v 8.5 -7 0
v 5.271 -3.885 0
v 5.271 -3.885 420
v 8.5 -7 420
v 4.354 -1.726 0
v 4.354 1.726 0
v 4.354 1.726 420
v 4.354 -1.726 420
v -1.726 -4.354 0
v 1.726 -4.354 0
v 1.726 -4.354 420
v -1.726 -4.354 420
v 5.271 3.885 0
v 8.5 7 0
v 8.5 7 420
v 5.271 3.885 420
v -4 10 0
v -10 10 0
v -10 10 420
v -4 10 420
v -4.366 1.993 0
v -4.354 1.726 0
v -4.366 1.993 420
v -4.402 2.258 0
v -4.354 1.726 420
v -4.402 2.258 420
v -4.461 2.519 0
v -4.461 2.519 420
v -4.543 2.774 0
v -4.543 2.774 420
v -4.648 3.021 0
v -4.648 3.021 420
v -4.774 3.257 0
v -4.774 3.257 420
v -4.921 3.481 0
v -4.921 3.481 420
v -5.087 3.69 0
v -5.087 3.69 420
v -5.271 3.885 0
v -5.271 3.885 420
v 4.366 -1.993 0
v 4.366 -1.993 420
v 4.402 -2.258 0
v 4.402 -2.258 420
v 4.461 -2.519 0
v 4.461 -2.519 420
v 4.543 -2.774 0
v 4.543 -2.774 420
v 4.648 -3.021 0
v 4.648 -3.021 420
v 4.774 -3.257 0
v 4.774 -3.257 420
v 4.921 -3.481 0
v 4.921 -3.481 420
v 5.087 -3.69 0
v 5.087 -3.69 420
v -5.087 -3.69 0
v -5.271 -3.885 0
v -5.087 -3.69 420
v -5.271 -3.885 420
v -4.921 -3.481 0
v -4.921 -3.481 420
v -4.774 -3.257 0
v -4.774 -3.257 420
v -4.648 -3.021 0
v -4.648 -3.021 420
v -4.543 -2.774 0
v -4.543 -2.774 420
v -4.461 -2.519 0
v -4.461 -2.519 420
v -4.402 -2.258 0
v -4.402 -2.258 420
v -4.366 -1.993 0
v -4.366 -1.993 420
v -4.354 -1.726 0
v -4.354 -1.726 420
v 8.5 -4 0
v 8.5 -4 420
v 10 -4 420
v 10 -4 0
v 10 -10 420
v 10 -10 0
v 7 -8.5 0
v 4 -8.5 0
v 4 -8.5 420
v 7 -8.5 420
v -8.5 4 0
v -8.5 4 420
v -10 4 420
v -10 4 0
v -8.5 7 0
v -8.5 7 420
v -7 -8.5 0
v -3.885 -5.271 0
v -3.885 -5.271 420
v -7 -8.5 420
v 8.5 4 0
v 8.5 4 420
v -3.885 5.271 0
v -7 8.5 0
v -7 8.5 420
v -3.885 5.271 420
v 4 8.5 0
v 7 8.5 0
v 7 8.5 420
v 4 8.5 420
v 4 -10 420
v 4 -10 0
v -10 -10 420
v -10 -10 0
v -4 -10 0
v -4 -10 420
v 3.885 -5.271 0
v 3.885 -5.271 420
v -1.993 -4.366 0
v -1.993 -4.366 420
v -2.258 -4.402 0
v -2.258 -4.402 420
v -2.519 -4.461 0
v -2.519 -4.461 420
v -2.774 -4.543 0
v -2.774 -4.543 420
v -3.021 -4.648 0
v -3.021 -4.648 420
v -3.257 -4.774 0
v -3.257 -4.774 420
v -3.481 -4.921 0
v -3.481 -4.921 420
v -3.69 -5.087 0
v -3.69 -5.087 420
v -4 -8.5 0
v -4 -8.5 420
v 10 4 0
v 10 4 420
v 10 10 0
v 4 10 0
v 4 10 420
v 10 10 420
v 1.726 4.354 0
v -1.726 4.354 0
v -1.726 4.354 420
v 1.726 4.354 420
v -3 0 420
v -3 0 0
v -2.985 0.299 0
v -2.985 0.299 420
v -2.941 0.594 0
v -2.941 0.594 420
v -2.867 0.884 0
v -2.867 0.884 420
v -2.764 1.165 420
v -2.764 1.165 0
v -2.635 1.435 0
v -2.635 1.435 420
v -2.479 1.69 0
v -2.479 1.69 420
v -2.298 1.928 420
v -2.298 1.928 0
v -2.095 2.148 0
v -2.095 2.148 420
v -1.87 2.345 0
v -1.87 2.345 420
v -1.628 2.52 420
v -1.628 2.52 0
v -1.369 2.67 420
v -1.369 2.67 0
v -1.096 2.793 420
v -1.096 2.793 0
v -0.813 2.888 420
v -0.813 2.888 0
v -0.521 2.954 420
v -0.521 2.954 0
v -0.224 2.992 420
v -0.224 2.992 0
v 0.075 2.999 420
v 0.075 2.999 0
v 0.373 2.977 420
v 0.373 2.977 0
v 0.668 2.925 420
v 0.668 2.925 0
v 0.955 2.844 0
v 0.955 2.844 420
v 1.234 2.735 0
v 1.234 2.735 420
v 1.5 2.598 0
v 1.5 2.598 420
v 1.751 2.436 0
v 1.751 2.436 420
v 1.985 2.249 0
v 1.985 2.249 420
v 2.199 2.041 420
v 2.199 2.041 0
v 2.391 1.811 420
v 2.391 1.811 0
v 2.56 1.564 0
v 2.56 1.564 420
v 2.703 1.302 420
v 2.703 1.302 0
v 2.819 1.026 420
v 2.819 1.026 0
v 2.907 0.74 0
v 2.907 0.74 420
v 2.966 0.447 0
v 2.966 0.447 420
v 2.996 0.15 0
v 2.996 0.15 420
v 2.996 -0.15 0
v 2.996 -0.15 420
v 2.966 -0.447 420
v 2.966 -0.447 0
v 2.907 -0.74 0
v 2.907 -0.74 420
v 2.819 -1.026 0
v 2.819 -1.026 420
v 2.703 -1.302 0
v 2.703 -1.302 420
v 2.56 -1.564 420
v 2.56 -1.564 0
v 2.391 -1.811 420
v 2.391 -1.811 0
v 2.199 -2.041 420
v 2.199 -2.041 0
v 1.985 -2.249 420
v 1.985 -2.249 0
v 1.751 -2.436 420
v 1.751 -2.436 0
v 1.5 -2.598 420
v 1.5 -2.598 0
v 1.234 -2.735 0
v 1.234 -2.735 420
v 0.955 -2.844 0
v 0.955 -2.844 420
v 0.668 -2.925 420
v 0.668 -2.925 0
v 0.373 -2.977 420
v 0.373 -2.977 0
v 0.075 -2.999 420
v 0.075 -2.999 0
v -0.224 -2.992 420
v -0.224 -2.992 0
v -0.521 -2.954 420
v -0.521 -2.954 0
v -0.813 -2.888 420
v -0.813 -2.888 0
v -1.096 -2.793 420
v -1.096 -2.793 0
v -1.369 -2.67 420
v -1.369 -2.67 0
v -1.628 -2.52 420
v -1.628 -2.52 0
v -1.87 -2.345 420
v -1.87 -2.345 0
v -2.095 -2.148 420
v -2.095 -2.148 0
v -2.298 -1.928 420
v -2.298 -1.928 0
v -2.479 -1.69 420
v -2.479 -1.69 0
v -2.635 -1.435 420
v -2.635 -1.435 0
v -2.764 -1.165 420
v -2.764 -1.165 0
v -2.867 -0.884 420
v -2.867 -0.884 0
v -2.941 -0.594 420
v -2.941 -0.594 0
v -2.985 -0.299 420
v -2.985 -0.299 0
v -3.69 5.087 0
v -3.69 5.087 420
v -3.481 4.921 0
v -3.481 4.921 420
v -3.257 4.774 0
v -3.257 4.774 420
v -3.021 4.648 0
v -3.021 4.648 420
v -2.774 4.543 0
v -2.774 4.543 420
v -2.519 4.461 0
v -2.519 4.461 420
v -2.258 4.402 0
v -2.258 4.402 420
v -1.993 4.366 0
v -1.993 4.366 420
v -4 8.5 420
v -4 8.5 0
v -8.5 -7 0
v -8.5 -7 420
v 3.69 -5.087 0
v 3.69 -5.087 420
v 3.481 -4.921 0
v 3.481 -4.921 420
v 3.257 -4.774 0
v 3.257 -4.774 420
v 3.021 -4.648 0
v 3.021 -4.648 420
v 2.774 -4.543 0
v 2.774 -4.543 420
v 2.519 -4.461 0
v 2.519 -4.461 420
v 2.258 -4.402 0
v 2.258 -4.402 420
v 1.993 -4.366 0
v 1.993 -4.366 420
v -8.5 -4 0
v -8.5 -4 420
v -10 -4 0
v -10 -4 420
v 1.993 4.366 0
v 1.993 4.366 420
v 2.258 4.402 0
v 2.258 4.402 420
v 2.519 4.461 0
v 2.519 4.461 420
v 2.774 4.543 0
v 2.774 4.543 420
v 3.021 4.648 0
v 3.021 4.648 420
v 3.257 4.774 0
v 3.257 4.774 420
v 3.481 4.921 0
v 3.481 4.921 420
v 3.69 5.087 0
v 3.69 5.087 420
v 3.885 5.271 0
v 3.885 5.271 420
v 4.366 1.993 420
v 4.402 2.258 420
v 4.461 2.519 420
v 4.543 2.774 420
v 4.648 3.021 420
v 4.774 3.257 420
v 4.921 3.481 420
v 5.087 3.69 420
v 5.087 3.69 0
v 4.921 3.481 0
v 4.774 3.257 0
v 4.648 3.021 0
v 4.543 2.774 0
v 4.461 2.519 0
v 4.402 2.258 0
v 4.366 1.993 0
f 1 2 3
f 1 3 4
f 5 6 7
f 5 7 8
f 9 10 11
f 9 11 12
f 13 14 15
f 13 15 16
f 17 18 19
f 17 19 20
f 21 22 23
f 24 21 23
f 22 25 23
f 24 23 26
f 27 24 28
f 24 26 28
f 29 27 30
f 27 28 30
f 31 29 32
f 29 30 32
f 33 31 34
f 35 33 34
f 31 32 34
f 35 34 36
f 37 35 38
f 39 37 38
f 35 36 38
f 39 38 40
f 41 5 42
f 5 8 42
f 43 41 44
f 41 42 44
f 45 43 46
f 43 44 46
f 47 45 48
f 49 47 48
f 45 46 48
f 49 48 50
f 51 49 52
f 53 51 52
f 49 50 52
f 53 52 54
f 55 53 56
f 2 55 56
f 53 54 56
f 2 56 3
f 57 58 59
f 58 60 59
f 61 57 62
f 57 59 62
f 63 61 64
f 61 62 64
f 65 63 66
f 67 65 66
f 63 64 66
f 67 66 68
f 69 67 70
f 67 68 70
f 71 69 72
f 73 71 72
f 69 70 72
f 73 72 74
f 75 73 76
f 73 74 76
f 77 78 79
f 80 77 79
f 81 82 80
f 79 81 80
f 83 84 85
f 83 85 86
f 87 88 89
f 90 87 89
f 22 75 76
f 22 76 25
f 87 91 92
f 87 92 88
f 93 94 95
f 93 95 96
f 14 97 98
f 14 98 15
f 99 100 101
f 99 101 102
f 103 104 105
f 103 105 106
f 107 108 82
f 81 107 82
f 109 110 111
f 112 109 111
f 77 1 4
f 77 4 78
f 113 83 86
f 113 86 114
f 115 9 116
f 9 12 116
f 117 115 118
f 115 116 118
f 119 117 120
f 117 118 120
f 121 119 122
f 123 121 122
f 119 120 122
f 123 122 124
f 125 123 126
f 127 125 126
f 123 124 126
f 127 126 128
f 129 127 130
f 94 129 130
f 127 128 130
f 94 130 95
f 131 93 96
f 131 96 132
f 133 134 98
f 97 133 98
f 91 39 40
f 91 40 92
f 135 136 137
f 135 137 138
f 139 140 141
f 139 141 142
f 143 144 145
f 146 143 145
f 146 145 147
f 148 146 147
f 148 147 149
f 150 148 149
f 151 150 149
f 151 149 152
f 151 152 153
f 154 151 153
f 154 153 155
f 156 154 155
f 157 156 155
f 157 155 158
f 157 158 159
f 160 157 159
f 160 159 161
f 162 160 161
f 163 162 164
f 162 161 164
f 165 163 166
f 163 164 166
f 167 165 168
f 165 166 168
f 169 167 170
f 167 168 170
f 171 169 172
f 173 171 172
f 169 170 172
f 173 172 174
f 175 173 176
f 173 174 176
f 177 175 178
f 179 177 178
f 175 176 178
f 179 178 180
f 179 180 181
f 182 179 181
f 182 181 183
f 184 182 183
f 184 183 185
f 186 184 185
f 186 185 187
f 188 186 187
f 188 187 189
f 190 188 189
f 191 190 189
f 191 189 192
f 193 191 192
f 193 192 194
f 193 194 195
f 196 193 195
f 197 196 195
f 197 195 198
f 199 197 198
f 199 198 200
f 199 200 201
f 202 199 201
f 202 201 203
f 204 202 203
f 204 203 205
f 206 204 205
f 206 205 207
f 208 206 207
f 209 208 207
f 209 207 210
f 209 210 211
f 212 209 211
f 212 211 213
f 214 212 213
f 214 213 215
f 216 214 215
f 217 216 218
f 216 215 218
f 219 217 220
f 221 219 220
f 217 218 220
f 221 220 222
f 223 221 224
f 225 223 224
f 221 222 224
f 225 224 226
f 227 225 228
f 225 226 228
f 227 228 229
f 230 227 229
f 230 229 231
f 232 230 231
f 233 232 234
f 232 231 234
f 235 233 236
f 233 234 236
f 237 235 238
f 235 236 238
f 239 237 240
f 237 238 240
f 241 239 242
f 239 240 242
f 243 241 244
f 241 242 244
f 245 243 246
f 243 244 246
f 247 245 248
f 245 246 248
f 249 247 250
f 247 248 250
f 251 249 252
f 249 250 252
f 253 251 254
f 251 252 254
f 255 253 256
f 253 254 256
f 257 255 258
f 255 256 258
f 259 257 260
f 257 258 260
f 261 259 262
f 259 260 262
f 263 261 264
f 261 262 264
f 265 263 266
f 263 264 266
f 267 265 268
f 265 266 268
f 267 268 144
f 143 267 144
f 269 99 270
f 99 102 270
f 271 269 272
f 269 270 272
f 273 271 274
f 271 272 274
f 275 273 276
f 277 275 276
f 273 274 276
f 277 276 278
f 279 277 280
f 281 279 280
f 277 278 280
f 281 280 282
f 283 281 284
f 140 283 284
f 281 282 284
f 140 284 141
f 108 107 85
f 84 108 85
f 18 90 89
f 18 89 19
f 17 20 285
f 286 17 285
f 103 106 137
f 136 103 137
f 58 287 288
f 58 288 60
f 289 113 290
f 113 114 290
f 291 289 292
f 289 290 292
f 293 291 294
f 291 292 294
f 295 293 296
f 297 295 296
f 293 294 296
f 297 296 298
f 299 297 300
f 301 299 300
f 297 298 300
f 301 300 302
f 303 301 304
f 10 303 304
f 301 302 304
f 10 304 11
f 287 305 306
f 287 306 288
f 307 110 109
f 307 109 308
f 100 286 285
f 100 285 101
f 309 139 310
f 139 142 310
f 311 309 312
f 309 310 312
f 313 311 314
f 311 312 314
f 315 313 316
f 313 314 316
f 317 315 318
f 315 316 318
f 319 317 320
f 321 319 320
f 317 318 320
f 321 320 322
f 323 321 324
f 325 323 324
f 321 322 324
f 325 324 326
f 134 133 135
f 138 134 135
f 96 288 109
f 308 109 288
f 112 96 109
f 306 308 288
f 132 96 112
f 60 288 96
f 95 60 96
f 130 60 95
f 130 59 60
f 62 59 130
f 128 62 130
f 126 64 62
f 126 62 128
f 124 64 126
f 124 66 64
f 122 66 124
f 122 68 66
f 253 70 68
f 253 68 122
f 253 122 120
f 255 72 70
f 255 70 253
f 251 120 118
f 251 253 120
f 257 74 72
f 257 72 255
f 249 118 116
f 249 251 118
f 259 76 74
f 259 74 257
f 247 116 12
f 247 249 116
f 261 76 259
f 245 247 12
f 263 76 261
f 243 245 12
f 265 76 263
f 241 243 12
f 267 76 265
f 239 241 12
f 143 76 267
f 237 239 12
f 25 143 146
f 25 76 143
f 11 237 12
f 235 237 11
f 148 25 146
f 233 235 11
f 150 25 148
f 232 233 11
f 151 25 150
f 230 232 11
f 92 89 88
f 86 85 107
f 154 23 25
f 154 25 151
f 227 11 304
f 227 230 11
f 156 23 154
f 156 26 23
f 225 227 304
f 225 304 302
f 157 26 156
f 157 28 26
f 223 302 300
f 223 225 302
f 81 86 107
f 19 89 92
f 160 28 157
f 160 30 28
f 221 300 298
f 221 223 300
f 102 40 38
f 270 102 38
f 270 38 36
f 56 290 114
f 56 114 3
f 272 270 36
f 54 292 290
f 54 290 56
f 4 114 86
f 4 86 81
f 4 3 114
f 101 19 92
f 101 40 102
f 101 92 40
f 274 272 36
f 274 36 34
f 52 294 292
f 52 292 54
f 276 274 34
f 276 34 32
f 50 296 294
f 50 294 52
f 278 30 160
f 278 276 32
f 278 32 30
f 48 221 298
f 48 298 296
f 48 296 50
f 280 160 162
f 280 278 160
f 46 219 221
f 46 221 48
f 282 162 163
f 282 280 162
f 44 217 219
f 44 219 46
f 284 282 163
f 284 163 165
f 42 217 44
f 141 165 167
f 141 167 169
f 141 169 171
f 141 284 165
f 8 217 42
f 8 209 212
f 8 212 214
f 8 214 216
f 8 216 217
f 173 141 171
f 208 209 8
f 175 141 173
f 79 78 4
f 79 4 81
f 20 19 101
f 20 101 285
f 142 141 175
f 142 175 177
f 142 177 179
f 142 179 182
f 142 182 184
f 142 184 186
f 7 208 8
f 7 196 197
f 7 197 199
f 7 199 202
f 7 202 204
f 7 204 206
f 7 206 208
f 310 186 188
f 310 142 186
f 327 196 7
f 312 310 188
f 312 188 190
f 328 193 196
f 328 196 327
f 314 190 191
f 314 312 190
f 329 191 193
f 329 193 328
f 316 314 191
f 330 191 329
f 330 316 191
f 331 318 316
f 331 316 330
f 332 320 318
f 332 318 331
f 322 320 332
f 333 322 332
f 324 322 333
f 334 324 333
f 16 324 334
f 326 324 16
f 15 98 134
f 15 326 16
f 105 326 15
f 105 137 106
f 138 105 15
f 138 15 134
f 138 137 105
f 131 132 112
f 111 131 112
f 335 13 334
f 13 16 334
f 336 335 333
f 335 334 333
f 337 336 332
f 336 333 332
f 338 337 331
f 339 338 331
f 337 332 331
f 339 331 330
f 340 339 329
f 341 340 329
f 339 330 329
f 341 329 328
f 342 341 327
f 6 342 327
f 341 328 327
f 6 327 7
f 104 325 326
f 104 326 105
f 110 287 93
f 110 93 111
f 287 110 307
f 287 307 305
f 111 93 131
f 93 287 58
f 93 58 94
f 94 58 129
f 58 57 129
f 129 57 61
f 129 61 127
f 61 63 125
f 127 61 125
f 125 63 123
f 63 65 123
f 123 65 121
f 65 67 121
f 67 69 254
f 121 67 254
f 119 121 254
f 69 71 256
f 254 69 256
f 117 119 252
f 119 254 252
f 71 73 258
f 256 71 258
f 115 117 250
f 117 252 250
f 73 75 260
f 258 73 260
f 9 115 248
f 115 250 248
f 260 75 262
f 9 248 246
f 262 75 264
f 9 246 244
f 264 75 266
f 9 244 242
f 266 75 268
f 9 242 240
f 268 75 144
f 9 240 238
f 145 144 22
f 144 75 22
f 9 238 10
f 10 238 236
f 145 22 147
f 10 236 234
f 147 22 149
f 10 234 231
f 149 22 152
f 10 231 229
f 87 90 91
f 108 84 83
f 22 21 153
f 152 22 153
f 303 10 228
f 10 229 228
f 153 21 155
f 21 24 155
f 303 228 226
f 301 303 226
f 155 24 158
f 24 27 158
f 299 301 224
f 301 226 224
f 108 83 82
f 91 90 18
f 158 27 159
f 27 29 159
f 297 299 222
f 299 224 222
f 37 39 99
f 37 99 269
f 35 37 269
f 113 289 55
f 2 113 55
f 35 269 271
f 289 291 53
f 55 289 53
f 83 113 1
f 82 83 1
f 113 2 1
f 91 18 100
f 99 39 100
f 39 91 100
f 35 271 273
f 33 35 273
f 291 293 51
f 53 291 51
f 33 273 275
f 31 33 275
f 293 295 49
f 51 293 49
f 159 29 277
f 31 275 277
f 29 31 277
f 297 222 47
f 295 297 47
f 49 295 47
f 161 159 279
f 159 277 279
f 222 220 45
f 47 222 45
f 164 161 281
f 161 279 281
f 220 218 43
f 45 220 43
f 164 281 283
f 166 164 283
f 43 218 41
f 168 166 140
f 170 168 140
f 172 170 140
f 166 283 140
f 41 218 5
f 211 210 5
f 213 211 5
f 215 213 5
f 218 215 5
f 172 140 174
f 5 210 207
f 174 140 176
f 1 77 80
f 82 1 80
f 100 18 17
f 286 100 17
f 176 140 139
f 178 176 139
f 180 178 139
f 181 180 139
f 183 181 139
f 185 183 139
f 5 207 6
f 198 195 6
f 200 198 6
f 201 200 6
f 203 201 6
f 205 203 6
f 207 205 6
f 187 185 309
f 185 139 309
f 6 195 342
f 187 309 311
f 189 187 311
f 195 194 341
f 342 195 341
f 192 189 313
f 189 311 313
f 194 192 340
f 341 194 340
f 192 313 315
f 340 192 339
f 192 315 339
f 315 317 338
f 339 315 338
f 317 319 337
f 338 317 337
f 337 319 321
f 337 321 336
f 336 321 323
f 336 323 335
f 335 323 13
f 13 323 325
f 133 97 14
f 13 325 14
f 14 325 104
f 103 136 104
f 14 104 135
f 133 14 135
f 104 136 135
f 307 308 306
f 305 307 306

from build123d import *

# Parameters (mm, degrees)
ESBO_O1_W                  = 20
ESBO_O1_H                  = 20
RESSALTO_EXTRUS_O1_DEPTH   = 420
ESBO_O2_R                  = 3
CORTE_EXTRUS_O1_DEPTH      = 1
CORTE_EXTRUS_O1_DEPTH_BACK = 421
FILETE1_R                  = 3


with BuildPart() as part:
    # Esboço1 → Ressalto-extrusão1 (new body)
    with BuildSketch(Plane.XY):
        Rectangle(ESBO_O1_W, ESBO_O1_H)
    extrude(amount=RESSALTO_EXTRUS_O1_DEPTH)

    # Esboço2 → Corte-extrusão1 (cut, two sides)
    with BuildSketch(Plane(origin=(0, 0, 0), x_dir=(-1, 0, 0), z_dir=(0, 0, -1))) as corte_extrus_o1_sk:
        Circle(ESBO_O2_R)
        Polygon((-10, 4), (-8.5, 4), (-8.5, 7), (-4.353828188, 3), (-4.353828188, -3), (-8.5, -7), (-8.5, -4), (-10, -4), align=None)
        Polygon((4, 10), (4, 8.5), (7, 8.5), (3, 4.353828188), (-3, 4.353828188), (-7, 8.5), (-4, 8.5), (-4, 10), align=None)
        Polygon((10, -4), (8.5, -4), (8.5, -7), (4.353828188, -3), (4.353828188, 3), (8.5, 7), (8.5, 4), (10, 4), align=None)
        Polygon((-4, -10), (-4, -8.5), (-7, -8.5), (-3, -4.353828188), (3, -4.353828188), (7, -8.5), (4, -8.5), (4, -10), align=None)
    extrude(amount=CORTE_EXTRUS_O1_DEPTH, mode=Mode.SUBTRACT)
    extrude(corte_extrus_o1_sk.sketch, amount=-CORTE_EXTRUS_O1_DEPTH_BACK, mode=Mode.SUBTRACT)

    # Filete1
    filete1_edges = [part.edges().sort_by_distance(p)[0] for p in [
        (-3, 4.353828188, 210),
        (3, 4.353828188, 210),
        (4.353828188, 3, 210),
        (4.353828188, -3, 210),
        (3, -4.353828188, 210),
        (-3, -4.353828188, 210),
        (-4.353828188, -3, 210),
        (-4.353828188, 3, 210),
    ]]
    fillet(filete1_edges, radius=FILETE1_R)


solid = part.part
